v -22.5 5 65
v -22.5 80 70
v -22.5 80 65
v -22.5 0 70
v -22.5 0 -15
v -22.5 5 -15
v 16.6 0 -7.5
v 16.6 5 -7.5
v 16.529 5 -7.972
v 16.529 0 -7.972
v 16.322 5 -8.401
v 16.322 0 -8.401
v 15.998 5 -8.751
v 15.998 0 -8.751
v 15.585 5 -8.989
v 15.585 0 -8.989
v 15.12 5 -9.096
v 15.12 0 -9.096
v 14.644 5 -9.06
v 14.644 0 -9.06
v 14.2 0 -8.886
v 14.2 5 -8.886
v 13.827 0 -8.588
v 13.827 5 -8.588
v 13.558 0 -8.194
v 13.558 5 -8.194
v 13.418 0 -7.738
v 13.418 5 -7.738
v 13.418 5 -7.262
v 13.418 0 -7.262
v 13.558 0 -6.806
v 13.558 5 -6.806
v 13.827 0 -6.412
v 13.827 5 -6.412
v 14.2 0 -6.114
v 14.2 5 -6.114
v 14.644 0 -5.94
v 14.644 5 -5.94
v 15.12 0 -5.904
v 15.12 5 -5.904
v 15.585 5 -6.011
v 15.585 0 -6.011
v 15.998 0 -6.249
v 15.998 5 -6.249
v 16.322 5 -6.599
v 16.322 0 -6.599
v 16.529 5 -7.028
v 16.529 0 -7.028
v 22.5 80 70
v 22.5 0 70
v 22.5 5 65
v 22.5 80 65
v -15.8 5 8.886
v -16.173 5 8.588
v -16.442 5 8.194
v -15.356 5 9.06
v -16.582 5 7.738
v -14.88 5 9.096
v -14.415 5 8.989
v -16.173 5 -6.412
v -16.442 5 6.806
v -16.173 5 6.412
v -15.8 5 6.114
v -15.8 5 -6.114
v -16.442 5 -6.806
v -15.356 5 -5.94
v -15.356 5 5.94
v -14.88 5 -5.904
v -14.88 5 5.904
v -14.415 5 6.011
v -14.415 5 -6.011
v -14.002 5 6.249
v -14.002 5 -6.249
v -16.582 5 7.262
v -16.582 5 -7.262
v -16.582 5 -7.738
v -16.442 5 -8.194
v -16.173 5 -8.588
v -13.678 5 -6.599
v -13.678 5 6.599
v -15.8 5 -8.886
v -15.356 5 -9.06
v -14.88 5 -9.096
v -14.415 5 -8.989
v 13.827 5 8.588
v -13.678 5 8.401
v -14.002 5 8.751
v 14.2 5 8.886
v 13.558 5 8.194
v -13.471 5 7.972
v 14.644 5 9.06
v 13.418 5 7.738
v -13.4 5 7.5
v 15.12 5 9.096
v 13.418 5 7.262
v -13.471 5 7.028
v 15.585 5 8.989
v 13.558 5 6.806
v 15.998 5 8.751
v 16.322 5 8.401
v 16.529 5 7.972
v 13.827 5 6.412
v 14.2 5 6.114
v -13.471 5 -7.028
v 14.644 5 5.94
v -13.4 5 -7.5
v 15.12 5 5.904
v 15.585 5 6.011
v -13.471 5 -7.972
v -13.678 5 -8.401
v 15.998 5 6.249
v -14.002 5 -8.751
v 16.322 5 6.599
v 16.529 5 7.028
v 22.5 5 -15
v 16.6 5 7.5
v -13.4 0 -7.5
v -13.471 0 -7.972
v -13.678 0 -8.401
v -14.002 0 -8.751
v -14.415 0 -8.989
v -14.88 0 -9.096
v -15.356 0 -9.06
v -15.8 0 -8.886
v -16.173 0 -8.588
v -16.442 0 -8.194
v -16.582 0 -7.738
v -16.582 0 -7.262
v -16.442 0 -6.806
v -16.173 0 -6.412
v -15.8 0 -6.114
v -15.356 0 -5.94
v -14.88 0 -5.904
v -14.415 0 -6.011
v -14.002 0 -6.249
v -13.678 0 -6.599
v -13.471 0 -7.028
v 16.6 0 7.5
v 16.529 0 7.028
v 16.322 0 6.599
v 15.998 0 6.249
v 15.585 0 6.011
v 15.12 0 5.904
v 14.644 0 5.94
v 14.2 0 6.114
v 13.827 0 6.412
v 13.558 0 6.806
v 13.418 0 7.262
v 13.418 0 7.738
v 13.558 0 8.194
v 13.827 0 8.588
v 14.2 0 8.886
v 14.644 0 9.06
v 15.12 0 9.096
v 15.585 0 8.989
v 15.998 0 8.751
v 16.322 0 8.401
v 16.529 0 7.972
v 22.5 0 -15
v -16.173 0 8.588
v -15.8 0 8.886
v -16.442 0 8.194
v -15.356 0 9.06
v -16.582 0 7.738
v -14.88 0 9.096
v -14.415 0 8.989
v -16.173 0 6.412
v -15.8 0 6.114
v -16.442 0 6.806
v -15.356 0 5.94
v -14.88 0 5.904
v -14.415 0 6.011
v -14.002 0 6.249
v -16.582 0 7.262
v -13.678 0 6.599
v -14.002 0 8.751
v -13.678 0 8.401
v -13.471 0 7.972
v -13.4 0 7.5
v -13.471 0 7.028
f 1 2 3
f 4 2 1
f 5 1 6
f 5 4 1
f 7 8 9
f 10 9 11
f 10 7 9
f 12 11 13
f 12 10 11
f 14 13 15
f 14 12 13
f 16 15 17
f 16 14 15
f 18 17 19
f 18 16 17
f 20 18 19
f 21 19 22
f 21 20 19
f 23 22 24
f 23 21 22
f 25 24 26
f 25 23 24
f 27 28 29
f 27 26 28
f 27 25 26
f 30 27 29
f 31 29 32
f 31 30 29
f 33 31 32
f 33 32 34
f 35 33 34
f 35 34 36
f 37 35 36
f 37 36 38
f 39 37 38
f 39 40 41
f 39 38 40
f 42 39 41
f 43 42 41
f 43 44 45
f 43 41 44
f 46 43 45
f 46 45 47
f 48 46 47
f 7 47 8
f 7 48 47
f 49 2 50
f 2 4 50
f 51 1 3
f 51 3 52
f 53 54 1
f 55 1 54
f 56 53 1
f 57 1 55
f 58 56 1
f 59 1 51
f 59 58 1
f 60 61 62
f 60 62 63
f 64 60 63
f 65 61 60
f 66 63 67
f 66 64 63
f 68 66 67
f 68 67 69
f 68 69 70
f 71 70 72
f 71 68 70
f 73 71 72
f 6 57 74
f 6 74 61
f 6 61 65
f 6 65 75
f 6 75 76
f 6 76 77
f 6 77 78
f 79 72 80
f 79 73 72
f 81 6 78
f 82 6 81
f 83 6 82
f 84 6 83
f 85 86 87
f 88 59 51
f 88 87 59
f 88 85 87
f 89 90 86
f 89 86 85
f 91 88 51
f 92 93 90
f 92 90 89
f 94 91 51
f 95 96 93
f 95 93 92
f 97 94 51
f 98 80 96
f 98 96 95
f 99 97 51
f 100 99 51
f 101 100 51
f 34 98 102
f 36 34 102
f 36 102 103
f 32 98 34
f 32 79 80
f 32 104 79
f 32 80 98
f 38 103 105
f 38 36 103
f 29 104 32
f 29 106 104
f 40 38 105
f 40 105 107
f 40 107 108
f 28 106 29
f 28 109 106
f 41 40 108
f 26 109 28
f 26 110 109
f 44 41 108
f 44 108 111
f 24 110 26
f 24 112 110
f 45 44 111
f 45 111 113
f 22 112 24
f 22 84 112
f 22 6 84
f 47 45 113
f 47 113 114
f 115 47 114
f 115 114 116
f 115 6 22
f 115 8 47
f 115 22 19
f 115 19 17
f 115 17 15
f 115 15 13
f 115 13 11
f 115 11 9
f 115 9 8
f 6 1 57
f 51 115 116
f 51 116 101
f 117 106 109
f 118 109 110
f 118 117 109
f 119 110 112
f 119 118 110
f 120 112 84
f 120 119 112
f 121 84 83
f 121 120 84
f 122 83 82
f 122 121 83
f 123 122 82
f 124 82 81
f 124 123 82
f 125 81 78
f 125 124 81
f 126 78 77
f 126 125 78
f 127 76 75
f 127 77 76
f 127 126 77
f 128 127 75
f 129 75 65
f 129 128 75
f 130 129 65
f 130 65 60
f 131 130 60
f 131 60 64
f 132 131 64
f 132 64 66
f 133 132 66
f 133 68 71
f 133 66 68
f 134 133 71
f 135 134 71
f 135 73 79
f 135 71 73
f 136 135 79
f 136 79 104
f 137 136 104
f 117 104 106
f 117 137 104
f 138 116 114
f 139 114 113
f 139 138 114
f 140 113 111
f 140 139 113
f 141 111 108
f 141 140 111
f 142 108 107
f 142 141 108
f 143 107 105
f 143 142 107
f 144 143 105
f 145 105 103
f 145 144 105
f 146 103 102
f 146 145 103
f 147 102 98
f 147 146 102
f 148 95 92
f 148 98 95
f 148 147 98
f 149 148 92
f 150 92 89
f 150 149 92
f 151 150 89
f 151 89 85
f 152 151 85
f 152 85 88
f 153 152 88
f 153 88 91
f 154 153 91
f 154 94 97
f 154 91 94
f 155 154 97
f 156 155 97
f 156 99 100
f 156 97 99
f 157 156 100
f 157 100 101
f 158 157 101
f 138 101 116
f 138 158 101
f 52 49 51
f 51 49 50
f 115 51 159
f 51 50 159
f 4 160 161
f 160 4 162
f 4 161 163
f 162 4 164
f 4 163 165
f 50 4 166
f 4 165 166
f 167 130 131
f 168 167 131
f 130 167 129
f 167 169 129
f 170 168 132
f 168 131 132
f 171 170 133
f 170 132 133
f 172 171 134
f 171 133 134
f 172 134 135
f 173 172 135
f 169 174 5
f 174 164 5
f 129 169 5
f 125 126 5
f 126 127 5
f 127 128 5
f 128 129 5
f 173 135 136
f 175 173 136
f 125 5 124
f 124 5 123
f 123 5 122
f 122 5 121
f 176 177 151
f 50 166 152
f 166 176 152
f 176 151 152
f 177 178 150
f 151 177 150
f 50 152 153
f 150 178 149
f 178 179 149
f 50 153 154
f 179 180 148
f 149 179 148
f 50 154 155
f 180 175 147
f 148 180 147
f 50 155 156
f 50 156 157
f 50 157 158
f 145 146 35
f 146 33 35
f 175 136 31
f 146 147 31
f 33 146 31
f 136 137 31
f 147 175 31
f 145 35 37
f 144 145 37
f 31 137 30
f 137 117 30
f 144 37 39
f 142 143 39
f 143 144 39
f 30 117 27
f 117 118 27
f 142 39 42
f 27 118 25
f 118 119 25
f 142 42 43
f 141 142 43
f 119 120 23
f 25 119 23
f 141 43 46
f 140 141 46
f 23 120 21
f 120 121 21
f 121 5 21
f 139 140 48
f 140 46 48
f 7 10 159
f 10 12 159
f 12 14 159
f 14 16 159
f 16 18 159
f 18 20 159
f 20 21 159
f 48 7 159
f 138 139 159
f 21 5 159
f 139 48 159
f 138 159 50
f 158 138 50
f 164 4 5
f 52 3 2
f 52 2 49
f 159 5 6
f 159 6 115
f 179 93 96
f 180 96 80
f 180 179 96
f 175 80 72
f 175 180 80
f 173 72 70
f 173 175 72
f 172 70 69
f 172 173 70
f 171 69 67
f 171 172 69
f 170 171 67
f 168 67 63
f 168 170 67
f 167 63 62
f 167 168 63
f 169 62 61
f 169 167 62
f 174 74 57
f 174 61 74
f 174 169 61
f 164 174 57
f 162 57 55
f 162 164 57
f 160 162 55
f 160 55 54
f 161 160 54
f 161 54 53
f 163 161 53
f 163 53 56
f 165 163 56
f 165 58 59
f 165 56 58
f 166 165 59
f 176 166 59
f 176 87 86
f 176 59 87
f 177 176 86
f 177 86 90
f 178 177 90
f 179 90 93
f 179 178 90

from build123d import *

# Parameters (mm, degrees)
SKETCH1_W           = 45
SKETCH1_H           = 30
BOSS_EXTRUDE1_DEPTH = 5
CUT_EXTRUDE1_REACH  = 7
SKETCH2_R           = 1.6
SKETCH4_W           = 45
SKETCH4_H           = 5
BOSS_EXTRUDE2_DEPTH = 55
SKETCH5_W           = 45
SKETCH5_H           = 5
BOSS_EXTRUDE3_DEPTH = 75


with BuildPart() as part:
    # Sketch1 → Boss-Extrude1 (new body)
    with BuildSketch(Plane(origin=(0, 0, 0), x_dir=(1, 0, 0), z_dir=(0, 1, 0))):
        Rectangle(SKETCH1_W, SKETCH1_H)
    extrude(amount=BOSS_EXTRUDE1_DEPTH)

    # Sketch2 → Cut-Extrude1 (cut, up to next)
    with BuildSketch(Plane(origin=(0, 0, 0), x_dir=(1, 0, 0), z_dir=(0, 1, 0)), mode=Mode.PRIVATE) as cut_extrude1_sk1:
        with Locations((-15, 7.5)):
            Circle(SKETCH2_R)
    cut_extrude1_tool1 = extrude(cut_extrude1_sk1.sketch, amount=CUT_EXTRUDE1_REACH, mode=Mode.PRIVATE) & part.part
    add(cut_extrude1_tool1.solids().sort_by_distance((-15, 0, -7.5))[0], mode=Mode.SUBTRACT)
    # Sketch2 → Cut-Extrude1 (cut, up to next)
    with BuildSketch(Plane(origin=(0, 0, 0), x_dir=(1, 0, 0), z_dir=(0, 1, 0)), mode=Mode.PRIVATE) as cut_extrude1_sk2:
        with Locations((15, 7.5)):
            Circle(SKETCH2_R)
    cut_extrude1_tool2 = extrude(cut_extrude1_sk2.sketch, amount=CUT_EXTRUDE1_REACH, mode=Mode.PRIVATE) & part.part
    add(cut_extrude1_tool2.solids().sort_by_distance((15, 0, -7.5))[0], mode=Mode.SUBTRACT)
    # Sketch2 → Cut-Extrude1 (cut, up to next)
    with BuildSketch(Plane(origin=(0, 0, 0), x_dir=(1, 0, 0), z_dir=(0, 1, 0)), mode=Mode.PRIVATE) as cut_extrude1_sk3:
        with Locations((15, -7.5)):
            Circle(SKETCH2_R)
    cut_extrude1_tool3 = extrude(cut_extrude1_sk3.sketch, amount=CUT_EXTRUDE1_REACH, mode=Mode.PRIVATE) & part.part
    add(cut_extrude1_tool3.solids().sort_by_distance((15, 0, 7.5))[0], mode=Mode.SUBTRACT)
    # Sketch2 → Cut-Extrude1 (cut, up to next)
    with BuildSketch(Plane(origin=(0, 0, 0), x_dir=(1, 0, 0), z_dir=(0, 1, 0)), mode=Mode.PRIVATE) as cut_extrude1_sk4:
        with Locations((-15, -7.5)):
            Circle(SKETCH2_R)
    cut_extrude1_tool4 = extrude(cut_extrude1_sk4.sketch, amount=CUT_EXTRUDE1_REACH, mode=Mode.PRIVATE) & part.part
    add(cut_extrude1_tool4.solids().sort_by_distance((-15, 0, 7.5))[0], mode=Mode.SUBTRACT)

    # Sketch4 → Boss-Extrude2 (add)
    with BuildSketch(Plane.XY.offset(15)):
        with Locations((0, 2.5)):
            Rectangle(SKETCH4_W, SKETCH4_H)
    extrude(amount=BOSS_EXTRUDE2_DEPTH)

    # Sketch5 → Boss-Extrude3 (add)
    with BuildSketch(Plane(origin=(0, 5, 0), x_dir=(1, 0, 0), z_dir=(0, 1, 0))):
        with Locations((0, -67.5)):
            Rectangle(SKETCH5_W, SKETCH5_H)
    extrude(amount=BOSS_EXTRUDE3_DEPTH)


solid = part.part
